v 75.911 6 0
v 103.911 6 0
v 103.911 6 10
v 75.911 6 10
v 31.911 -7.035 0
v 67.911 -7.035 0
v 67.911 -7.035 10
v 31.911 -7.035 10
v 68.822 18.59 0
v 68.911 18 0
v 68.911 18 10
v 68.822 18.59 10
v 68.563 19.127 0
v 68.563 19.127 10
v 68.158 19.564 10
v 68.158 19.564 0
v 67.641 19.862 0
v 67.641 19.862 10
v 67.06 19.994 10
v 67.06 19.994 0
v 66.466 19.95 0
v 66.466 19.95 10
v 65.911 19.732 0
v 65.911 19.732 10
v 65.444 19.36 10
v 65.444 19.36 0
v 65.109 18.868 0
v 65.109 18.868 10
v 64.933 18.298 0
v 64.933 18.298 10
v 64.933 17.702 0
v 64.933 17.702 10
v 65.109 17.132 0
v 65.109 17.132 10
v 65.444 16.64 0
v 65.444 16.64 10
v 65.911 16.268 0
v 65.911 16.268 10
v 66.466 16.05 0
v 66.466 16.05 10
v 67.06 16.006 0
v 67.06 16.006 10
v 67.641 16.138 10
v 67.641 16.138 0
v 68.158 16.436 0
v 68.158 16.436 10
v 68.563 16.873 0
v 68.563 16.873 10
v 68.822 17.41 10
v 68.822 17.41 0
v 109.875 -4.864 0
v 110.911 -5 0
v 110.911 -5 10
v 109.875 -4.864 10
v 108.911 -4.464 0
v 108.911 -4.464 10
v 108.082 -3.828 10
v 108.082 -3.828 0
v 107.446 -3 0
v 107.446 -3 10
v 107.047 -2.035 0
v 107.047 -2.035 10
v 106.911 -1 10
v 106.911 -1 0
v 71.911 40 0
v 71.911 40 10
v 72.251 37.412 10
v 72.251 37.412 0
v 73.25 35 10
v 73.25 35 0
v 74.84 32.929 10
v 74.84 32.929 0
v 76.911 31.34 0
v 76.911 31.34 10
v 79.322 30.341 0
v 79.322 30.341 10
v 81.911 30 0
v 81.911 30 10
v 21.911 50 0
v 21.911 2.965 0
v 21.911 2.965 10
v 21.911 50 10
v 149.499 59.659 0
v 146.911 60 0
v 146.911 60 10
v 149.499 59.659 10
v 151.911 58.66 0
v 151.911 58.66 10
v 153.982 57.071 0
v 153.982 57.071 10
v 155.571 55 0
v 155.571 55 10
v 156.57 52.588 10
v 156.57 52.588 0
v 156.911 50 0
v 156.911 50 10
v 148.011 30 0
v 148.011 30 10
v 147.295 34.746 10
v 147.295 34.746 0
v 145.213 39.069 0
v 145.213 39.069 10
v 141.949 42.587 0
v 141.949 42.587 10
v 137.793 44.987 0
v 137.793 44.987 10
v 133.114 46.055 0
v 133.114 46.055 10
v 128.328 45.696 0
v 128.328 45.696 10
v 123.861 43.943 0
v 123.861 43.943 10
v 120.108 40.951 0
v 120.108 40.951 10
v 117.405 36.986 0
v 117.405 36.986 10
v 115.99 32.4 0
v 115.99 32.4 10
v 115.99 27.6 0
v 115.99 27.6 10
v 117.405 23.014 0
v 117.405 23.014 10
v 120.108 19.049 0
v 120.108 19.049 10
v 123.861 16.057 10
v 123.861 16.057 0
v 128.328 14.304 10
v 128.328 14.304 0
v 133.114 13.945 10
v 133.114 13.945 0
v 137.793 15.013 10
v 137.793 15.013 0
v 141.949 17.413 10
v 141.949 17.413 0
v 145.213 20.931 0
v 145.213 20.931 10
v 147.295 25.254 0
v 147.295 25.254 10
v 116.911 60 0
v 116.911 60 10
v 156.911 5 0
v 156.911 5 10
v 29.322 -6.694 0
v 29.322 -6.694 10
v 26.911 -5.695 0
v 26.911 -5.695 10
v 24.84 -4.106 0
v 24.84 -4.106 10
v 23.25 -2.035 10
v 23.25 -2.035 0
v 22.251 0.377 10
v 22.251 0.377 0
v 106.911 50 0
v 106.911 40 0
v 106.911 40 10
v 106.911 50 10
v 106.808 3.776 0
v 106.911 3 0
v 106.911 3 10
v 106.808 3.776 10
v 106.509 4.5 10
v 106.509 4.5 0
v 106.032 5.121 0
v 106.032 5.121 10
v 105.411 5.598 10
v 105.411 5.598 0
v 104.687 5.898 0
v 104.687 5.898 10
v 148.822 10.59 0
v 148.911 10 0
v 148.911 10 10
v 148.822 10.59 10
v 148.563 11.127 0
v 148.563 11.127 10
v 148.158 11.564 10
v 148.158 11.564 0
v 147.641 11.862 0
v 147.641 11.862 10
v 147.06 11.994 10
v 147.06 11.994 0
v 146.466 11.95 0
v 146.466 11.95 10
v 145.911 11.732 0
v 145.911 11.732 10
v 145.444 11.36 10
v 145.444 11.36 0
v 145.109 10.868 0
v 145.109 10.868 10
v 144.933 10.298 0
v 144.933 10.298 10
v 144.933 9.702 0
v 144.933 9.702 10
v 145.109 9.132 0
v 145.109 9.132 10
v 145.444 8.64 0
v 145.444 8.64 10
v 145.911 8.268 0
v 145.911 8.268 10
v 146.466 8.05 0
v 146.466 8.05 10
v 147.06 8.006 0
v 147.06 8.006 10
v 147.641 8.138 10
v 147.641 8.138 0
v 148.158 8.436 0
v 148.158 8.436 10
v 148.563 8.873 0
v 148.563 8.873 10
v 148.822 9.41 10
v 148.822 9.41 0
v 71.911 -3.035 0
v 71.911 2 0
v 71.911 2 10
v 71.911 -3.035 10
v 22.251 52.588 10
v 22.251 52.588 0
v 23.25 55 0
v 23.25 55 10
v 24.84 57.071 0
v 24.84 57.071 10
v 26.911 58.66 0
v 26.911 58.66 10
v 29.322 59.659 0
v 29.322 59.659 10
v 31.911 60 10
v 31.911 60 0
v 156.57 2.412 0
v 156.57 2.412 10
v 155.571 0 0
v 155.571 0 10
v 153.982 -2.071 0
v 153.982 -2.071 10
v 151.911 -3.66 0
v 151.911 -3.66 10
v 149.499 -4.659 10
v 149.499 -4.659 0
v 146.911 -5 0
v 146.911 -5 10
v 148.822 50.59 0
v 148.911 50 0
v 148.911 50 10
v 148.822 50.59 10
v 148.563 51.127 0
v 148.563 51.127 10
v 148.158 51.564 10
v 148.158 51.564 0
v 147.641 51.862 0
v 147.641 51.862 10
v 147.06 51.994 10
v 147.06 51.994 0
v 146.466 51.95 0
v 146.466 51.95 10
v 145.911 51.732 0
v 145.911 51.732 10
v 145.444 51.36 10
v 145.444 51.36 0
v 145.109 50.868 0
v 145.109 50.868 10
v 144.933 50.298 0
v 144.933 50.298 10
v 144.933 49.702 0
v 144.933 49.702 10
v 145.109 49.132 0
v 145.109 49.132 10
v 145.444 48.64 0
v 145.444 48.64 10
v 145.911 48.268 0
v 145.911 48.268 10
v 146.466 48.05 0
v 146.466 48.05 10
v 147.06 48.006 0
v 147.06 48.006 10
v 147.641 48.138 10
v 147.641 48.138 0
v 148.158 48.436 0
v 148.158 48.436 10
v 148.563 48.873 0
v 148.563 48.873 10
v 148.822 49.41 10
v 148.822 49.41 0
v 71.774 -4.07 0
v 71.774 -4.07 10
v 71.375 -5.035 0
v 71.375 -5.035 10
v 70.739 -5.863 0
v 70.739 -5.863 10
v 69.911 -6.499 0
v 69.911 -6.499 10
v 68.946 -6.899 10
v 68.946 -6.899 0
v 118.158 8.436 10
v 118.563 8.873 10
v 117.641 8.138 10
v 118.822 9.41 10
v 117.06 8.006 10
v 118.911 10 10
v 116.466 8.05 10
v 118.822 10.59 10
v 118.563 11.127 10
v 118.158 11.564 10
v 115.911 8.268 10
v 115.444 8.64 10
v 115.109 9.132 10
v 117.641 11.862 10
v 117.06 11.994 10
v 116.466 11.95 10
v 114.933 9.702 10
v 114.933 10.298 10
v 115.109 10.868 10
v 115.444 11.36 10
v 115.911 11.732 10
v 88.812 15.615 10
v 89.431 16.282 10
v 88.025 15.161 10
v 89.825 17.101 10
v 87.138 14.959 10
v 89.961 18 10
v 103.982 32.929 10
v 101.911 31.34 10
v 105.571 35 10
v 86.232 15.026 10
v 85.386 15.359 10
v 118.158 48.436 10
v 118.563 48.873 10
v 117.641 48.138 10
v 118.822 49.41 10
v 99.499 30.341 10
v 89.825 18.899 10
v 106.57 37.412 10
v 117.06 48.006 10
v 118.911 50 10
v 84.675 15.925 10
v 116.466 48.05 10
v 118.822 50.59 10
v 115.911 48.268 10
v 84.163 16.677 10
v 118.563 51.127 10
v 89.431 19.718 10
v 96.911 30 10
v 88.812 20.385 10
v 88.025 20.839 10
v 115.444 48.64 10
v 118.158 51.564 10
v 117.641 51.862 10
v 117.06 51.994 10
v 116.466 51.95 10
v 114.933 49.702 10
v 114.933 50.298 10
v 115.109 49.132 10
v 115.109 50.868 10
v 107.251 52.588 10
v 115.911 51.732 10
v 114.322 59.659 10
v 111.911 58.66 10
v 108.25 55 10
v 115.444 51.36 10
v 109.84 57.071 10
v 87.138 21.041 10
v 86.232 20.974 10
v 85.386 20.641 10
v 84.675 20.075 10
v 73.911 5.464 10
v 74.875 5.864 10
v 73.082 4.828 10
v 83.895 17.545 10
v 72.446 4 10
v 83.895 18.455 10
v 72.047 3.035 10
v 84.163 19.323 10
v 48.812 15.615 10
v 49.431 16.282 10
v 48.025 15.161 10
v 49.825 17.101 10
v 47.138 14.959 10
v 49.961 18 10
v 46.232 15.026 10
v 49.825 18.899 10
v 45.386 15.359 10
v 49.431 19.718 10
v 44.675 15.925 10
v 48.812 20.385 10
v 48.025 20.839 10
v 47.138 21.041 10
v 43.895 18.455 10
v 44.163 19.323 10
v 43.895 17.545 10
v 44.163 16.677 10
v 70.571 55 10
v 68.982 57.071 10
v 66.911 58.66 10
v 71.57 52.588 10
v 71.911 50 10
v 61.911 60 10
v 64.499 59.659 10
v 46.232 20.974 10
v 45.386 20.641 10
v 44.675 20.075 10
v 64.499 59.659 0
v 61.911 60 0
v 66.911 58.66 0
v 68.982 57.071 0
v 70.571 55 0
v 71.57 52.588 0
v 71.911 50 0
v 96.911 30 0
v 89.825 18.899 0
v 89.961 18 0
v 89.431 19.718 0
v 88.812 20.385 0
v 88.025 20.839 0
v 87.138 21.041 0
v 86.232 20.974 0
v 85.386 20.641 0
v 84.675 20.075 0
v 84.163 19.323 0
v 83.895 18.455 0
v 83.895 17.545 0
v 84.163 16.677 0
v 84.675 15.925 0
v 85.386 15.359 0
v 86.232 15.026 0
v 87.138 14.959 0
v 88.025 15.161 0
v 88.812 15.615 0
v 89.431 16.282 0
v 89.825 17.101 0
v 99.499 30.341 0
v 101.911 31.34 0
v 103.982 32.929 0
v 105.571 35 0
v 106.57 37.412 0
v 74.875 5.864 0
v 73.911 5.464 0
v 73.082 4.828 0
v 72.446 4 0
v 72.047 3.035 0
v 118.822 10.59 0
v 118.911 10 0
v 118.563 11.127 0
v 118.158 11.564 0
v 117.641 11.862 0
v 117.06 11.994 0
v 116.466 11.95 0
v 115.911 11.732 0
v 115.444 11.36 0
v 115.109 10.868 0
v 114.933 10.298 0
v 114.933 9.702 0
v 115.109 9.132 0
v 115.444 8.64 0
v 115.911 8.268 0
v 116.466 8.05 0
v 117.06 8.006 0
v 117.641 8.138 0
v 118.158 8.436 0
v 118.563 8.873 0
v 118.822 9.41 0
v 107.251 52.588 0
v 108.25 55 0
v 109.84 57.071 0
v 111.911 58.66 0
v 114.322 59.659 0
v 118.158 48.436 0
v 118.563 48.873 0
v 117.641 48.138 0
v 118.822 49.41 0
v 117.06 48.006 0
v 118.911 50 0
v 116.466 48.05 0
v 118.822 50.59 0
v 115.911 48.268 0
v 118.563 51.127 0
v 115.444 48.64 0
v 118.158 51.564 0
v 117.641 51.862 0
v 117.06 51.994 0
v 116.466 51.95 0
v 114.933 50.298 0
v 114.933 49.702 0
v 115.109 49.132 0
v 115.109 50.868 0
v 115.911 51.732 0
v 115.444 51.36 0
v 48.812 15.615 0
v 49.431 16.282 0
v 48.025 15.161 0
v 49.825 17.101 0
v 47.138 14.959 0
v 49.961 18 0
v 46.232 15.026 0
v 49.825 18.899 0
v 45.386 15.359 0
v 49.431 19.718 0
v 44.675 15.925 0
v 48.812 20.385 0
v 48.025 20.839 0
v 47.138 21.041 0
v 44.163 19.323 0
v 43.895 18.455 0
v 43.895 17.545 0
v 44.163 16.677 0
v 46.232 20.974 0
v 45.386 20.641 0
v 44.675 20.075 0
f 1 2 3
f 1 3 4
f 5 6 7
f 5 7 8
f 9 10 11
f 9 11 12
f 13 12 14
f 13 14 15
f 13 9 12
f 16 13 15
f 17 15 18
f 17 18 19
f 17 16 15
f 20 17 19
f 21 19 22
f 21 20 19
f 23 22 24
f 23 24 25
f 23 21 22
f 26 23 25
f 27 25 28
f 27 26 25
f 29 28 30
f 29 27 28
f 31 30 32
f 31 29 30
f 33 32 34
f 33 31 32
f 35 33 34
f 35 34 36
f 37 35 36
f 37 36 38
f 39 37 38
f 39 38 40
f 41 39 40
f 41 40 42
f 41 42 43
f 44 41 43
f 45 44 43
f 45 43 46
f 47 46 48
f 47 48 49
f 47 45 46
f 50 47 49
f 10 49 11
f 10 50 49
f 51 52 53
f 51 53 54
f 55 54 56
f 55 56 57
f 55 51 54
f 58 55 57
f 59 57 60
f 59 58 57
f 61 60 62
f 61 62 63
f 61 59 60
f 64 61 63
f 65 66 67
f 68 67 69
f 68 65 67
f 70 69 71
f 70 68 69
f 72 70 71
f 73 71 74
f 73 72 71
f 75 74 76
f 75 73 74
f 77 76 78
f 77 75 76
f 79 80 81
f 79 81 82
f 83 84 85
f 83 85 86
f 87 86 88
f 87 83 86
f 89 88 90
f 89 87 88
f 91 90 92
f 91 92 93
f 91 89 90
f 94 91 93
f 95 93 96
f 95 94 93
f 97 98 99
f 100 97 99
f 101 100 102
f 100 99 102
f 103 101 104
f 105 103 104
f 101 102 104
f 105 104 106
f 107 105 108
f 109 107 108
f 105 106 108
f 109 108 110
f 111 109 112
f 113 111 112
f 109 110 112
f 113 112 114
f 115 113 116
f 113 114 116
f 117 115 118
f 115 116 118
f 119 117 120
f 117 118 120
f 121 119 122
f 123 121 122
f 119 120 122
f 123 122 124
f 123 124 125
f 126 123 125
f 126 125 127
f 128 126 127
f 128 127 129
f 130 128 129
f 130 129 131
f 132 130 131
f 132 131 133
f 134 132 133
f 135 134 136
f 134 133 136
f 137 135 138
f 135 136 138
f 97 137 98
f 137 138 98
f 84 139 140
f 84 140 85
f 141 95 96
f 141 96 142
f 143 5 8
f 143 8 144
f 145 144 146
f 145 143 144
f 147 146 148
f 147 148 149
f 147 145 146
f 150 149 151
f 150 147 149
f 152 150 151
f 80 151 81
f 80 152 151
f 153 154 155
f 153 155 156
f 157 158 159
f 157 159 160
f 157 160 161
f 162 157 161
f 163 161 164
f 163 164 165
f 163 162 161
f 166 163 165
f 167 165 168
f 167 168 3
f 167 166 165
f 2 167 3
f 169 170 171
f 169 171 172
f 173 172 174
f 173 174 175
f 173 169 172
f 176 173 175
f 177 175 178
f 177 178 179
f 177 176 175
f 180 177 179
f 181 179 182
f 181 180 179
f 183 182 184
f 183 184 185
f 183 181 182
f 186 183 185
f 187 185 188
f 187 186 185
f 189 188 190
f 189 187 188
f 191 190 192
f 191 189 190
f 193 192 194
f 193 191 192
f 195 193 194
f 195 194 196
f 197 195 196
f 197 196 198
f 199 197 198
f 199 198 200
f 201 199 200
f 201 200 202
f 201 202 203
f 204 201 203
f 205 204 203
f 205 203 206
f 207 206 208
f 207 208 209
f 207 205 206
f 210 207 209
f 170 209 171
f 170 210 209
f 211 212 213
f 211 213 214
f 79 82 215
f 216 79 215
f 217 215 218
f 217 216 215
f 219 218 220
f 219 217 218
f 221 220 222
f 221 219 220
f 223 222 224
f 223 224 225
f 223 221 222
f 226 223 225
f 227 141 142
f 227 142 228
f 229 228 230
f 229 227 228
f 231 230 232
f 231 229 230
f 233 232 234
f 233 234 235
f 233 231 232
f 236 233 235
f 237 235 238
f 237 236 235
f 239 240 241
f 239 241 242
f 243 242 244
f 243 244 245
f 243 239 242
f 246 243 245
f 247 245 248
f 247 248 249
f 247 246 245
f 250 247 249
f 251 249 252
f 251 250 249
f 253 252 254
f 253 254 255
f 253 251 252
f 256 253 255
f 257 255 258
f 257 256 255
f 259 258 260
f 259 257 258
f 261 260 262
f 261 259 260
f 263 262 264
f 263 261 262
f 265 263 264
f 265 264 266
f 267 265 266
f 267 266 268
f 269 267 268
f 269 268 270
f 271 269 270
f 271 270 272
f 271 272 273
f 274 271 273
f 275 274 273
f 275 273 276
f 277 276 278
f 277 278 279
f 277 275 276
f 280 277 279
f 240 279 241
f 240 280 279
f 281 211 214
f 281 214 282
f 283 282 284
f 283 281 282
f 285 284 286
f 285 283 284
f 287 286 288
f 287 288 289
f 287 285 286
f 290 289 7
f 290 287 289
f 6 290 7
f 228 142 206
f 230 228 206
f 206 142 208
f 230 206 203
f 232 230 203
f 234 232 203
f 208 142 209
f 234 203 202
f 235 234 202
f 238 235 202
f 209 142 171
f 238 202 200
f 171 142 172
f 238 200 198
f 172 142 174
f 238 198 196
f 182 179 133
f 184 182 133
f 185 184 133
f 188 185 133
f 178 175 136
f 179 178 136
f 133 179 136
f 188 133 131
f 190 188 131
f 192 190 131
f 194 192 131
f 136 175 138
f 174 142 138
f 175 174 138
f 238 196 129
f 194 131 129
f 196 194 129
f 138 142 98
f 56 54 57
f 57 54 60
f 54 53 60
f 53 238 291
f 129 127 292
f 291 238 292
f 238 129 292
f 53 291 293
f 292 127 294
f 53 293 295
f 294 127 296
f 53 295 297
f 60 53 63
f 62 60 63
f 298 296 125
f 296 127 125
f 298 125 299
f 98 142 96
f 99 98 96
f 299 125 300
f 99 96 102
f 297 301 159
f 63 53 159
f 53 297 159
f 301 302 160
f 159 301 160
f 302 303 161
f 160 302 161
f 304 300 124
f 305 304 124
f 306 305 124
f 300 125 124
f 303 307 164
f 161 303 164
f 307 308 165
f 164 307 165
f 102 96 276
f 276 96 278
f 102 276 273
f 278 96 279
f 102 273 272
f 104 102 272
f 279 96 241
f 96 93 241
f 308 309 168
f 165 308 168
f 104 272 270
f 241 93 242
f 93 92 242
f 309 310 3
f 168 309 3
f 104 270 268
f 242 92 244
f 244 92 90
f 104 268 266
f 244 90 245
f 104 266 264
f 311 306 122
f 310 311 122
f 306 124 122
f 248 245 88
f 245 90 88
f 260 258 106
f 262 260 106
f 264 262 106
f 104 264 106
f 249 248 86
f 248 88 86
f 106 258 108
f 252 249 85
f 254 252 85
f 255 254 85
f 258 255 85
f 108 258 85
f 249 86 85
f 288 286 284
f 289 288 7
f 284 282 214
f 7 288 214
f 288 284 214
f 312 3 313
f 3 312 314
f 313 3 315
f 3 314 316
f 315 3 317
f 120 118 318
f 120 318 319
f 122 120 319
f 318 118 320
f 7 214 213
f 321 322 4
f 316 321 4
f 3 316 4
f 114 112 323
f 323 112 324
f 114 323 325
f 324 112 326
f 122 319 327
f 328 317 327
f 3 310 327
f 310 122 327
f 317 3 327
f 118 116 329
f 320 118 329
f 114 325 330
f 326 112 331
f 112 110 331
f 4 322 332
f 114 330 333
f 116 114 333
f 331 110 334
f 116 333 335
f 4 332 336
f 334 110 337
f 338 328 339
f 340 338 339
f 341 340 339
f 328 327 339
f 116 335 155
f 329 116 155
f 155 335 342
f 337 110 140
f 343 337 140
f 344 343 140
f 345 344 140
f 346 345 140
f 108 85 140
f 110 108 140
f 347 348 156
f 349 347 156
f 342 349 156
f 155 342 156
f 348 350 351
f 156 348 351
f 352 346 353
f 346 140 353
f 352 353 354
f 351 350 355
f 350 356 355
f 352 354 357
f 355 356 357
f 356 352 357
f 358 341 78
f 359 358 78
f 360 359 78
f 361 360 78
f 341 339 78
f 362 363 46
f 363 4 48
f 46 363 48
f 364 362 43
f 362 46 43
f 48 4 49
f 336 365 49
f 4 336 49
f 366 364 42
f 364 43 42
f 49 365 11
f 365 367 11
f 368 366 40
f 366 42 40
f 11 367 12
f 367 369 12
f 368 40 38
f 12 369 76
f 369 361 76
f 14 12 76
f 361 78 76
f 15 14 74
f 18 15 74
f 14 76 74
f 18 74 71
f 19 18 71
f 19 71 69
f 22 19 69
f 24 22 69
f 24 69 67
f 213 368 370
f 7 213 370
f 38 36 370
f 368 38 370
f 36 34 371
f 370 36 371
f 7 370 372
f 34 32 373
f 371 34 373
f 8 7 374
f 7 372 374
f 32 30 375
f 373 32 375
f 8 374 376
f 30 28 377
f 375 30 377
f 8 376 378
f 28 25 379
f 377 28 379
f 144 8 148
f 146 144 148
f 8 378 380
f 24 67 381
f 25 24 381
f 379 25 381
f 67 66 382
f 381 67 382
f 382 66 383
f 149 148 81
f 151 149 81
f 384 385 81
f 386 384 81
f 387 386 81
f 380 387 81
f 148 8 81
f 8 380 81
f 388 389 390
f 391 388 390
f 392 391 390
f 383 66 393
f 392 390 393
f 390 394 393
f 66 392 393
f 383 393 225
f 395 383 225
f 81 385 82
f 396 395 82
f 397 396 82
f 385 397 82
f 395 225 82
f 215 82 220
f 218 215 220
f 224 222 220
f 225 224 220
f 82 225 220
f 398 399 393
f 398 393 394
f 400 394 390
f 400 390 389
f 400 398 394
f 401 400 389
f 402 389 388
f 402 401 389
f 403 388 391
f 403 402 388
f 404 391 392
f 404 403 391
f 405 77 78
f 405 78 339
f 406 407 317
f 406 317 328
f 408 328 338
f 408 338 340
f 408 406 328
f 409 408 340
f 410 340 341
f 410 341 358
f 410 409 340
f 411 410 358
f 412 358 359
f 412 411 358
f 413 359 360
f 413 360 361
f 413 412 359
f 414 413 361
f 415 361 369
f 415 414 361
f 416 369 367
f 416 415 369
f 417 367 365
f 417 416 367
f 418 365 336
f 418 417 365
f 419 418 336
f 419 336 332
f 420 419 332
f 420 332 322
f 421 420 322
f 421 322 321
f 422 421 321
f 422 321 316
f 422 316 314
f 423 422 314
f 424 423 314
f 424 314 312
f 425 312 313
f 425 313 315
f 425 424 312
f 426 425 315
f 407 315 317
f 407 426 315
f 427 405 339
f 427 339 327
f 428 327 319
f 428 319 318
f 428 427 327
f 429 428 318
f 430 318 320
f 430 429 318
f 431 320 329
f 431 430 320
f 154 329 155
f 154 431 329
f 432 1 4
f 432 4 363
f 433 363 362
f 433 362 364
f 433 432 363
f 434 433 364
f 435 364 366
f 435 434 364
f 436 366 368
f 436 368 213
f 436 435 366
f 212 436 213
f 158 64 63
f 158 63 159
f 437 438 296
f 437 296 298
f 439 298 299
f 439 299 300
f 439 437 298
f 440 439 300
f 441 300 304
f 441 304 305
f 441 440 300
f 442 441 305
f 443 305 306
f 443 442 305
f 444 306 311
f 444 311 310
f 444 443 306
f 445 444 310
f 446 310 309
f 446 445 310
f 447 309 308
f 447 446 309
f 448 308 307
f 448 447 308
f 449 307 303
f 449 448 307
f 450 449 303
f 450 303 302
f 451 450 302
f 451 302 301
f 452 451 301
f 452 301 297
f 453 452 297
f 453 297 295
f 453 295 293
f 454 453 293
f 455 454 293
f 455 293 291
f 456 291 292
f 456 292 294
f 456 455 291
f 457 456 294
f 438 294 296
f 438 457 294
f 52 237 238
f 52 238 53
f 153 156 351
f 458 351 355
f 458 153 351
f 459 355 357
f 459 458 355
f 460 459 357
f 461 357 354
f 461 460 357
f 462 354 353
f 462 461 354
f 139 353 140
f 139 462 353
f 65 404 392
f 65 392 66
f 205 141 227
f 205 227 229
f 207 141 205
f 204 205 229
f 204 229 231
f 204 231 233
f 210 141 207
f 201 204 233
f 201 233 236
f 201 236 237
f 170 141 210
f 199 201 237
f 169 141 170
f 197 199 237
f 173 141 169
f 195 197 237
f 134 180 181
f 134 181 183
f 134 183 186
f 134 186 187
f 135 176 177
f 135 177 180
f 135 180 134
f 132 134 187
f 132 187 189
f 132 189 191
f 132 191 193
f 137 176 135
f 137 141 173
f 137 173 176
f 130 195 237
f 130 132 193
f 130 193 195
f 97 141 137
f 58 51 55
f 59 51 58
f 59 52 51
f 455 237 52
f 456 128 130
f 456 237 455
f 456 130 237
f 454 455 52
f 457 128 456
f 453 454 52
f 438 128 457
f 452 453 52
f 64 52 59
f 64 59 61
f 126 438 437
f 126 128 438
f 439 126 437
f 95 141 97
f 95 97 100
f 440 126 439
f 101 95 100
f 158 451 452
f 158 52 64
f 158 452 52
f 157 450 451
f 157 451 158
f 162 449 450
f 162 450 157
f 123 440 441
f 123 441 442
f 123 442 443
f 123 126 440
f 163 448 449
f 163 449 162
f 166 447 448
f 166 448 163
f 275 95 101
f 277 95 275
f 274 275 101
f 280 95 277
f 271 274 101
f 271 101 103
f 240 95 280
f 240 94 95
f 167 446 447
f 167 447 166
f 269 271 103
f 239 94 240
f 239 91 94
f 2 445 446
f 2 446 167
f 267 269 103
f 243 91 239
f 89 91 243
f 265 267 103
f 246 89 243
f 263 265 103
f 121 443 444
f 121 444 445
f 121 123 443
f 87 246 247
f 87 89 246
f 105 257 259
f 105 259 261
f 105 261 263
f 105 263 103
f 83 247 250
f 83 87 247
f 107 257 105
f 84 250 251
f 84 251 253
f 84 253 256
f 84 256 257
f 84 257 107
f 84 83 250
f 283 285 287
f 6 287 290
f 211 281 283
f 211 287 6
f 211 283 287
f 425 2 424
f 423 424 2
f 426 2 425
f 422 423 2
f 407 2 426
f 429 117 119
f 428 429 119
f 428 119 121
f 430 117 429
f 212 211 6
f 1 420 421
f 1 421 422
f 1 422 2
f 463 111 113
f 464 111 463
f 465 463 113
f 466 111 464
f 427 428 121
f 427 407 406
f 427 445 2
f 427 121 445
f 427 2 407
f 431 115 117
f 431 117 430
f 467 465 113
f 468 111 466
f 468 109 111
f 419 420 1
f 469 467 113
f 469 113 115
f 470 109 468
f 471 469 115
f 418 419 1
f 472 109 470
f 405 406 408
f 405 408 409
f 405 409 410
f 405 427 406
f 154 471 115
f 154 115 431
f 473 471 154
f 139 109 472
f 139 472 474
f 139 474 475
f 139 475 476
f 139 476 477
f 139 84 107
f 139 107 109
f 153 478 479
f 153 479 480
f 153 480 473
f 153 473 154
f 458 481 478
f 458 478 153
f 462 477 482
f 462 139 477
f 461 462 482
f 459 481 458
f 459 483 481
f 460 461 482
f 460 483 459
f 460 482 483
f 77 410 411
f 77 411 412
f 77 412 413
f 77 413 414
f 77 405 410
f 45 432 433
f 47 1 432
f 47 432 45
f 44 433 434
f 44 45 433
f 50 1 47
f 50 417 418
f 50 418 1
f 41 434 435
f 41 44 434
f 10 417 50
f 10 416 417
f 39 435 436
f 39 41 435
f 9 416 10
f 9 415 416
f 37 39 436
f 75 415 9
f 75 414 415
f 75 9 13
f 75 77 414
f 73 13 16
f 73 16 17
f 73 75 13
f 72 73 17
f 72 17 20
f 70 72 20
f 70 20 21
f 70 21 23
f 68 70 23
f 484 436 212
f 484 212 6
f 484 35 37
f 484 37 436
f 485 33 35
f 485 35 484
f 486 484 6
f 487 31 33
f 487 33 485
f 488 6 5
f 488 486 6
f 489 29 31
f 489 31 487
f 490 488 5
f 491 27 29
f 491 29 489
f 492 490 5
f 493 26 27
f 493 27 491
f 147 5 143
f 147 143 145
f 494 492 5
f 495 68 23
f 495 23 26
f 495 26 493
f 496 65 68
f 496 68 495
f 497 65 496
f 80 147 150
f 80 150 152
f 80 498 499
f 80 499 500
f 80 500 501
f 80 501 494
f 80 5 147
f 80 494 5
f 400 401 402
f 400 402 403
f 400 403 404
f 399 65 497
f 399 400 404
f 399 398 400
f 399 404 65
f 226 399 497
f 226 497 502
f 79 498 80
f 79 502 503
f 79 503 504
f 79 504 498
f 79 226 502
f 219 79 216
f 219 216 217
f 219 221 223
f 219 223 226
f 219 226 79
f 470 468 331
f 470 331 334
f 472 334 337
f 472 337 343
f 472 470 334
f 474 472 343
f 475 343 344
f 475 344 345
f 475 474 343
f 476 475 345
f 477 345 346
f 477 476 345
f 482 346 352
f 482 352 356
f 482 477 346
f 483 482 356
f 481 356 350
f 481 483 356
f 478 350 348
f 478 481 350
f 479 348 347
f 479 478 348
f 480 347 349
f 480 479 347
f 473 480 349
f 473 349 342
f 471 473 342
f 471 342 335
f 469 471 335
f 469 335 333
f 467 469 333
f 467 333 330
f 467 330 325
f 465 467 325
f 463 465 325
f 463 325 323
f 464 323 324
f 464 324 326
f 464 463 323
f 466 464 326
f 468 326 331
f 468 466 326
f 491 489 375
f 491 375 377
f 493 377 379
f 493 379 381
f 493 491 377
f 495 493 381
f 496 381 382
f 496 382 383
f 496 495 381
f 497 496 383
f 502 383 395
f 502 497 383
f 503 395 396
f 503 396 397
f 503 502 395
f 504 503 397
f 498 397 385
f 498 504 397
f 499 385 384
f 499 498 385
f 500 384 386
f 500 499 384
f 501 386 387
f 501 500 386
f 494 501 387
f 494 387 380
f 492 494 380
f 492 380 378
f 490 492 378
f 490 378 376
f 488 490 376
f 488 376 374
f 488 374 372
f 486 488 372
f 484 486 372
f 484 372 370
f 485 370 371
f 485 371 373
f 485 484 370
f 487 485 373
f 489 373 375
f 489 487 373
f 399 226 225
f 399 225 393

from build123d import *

# Parameters (mm, degrees)
MODEL_R             = 2
MODEL_R_2           = 3.05
MODEL_R_3           = 6.75
BOSS_EXTRUDE1_DEPTH = 10
SKETCH2_R           = 16.1
CUT_EXTRUDE1_DEPTH  = 10


with BuildPart() as part:
    # Model → Boss-Extrude1 (new body)
    with BuildSketch(Plane.XY):
        with BuildLine():
            Line((106.910569106, -1), (106.910569106, 3))
            ThreePointArc((106.910569106, 3), (106.031889449, 5.121320344), (103.910569106, 6))
            Line((103.910569106, 6), (75.910569106, 6))
            ThreePointArc((75.910569106, 6), (73.082141981, 4.828427125), (71.910569106, 2))
            Line((71.910569106, 2), (71.910569106, -3.03491552))
            ThreePointArc((71.910569106, -3.03491552), (70.73899623, -5.863342645), (67.910569106, -7.034915521))
            Line((67.910569106, -7.034915521), (31.910569106, -7.034915521))
            ThreePointArc((31.910569106, -7.034915521), (24.839501294, -4.105983332), (21.910569106, 2.96508448))
            Line((21.910569106, 2.96508448), (21.910569106, 50))
            ThreePointArc((21.910569106, 50), (24.839501294, 57.071067812), (31.910569106, 60))
            Line((31.910569106, 60), (61.910569106, 60))
            ThreePointArc((61.910569106, 60), (68.981636918, 57.071067812), (71.910569106, 50))
            Line((71.910569106, 50), (71.910569106, 40))
            ThreePointArc((71.910569106, 40), (74.839501294, 32.928932188), (81.910569106, 30))
            Line((81.910569106, 30), (96.910569106, 30))
            ThreePointArc((96.910569106, 30), (103.981636918, 32.928932188), (106.910569106, 40))
            Line((106.910569106, 40), (106.910569106, 50))
            ThreePointArc((106.910569106, 50), (109.839501294, 57.071067812), (116.910569106, 60))
            Line((116.910569106, 60), (146.910569106, 60))
            ThreePointArc((146.910569106, 60), (153.981636918, 57.071067812), (156.910569106, 50))
            Line((156.910569106, 50), (156.910569106, 5))
            ThreePointArc((156.910569106, 5), (153.981636918, -2.071067812), (146.910569106, -5))
            Line((146.910569106, -5), (110.910569106, -5))
            ThreePointArc((110.910569106, -5), (108.082141981, -3.828427125), (106.910569106, -1))
        make_face()
        with Locations((66.910569106, 18)):
            Circle(MODEL_R, mode=Mode.SUBTRACT)
        with Locations((46.910569106, 18)):
            Circle(MODEL_R_2, mode=Mode.SUBTRACT)
        with Locations((116.910569106, 10)):
            Circle(MODEL_R, mode=Mode.SUBTRACT)
        with Locations((146.910569106, 10)):
            Circle(MODEL_R, mode=Mode.SUBTRACT)
        with Locations((146.910569106, 50)):
            Circle(MODEL_R, mode=Mode.SUBTRACT)
        with Locations((116.910569106, 50)):
            Circle(MODEL_R, mode=Mode.SUBTRACT)
        with Locations((131.910569106, 30)):
            Circle(MODEL_R_3, mode=Mode.SUBTRACT)
        with Locations((86.910569106, 18)):
            Circle(MODEL_R_2, mode=Mode.SUBTRACT)
    extrude(amount=BOSS_EXTRUDE1_DEPTH)

    # Sketch2 → Cut-Extrude1 (cut)
    with BuildSketch(Plane.XY.offset(10)):
        with Locations((131.910569106, 30)):
            Circle(SKETCH2_R)
    extrude(amount=-CUT_EXTRUDE1_DEPTH, mode=Mode.SUBTRACT)


solid = part.part
